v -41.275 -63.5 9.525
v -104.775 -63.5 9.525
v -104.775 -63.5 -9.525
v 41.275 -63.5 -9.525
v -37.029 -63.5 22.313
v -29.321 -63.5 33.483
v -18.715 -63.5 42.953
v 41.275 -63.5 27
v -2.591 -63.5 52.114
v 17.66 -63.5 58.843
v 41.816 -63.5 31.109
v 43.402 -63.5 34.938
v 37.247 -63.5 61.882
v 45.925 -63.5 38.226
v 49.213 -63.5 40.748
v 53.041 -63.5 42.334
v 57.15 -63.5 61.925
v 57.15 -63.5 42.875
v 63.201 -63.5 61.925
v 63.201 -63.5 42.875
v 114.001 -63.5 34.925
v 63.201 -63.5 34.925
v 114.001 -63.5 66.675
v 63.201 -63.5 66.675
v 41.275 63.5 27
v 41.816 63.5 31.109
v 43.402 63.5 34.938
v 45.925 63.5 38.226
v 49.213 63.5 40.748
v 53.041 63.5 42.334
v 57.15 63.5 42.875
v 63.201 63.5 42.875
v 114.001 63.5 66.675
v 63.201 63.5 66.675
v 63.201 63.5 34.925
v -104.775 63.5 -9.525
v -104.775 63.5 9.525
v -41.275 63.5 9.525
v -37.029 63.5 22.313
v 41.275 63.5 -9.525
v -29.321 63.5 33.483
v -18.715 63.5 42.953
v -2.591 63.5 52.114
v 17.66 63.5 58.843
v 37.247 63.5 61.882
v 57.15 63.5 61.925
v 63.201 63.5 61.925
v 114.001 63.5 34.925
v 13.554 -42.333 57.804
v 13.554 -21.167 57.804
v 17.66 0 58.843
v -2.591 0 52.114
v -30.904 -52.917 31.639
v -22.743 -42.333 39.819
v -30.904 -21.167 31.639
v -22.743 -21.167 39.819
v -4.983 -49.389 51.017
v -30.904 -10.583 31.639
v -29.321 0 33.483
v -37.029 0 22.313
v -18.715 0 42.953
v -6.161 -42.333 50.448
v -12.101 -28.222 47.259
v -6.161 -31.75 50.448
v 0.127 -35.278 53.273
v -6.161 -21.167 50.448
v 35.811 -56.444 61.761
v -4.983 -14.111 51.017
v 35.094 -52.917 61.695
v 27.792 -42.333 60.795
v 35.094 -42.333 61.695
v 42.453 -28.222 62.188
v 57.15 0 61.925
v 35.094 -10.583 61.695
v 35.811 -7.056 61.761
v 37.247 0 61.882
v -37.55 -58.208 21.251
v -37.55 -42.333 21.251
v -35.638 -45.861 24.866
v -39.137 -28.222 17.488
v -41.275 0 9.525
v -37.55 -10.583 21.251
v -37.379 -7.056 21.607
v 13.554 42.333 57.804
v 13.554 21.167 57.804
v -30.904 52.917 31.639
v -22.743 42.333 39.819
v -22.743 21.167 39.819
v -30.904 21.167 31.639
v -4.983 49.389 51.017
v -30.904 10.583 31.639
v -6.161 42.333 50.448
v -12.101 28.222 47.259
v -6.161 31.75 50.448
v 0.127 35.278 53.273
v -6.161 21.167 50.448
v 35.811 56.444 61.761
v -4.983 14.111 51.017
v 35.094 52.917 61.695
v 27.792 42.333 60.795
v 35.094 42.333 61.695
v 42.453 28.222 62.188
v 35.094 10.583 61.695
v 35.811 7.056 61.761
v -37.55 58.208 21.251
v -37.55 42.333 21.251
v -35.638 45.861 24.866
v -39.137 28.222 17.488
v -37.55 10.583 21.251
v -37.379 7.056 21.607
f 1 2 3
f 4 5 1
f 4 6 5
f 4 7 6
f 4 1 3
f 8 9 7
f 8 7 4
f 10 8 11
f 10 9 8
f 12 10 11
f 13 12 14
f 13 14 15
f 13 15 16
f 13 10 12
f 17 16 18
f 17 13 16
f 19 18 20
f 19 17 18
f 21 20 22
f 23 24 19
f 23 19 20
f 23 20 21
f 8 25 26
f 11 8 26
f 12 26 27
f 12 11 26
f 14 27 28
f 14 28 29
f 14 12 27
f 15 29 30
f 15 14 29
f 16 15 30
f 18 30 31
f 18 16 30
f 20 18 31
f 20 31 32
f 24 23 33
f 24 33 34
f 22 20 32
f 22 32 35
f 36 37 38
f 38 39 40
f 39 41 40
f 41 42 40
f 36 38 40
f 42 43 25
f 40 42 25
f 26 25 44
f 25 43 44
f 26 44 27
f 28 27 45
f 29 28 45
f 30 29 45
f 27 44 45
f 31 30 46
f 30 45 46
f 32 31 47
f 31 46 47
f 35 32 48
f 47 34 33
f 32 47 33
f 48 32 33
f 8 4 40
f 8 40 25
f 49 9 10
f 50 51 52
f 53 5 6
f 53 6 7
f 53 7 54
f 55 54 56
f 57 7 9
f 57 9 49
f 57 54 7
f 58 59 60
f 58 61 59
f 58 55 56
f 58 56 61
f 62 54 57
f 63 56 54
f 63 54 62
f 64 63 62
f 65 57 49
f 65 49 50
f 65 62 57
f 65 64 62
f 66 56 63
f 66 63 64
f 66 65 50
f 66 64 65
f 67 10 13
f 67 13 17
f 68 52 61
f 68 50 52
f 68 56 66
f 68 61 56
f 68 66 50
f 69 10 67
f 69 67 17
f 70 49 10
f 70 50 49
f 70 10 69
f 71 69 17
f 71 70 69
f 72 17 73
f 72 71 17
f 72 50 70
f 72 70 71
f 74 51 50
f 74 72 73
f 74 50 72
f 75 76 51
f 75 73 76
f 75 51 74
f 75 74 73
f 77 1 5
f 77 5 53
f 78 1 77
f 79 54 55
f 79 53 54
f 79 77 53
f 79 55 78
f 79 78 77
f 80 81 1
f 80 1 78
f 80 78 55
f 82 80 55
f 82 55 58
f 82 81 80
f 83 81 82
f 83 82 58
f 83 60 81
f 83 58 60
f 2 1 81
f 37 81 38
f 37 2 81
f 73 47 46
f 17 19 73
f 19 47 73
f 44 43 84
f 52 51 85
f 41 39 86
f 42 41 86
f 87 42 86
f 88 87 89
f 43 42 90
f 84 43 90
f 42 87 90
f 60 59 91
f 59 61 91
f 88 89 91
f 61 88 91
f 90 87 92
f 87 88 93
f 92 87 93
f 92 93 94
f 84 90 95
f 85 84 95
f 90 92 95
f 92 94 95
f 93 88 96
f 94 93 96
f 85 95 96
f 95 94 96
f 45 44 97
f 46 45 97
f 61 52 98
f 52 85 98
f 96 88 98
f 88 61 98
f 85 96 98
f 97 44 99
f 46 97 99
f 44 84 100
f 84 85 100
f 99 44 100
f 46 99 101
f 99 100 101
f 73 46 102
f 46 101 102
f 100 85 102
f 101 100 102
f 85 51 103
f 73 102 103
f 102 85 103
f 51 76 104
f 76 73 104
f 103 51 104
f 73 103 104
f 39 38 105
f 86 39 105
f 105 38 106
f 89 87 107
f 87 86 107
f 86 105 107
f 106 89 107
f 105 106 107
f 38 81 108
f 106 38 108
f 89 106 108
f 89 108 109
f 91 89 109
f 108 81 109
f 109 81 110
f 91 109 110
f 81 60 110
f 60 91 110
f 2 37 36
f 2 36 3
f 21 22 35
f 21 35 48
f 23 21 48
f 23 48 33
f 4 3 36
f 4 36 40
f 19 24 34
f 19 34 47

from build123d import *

# Parameters (mm, degrees)
F1_DEPTH = 63.5
F2_DEPTH = 63.5
F3_DEPTH = 63.5


with BuildPart() as f1:
    # F0 (on Front) → F1 (new body, symmetric)
    with BuildSketch(Plane.XZ):
        Polygon((-41.275, 9.525), (-41.275, -9.525), (41.275, -9.525), (41.275, 9.525), (22.225, 9.525), align=None)
    extrude(amount=F1_DEPTH, both=True)

    # F0 (on Front) → F2 (join, symmetric)
    with BuildSketch(Plane.XZ):
        Polygon((-41.275, 9.525), (-41.275, -9.525), (41.275, -9.525), (41.275, 9.525), (22.225, 9.525), align=None)
        with BuildLine():
            add(Edge.make_bspline(
                [(-41.275, 9.525), (-35.113391, 45.455925), (13.393071, 65.25448), (57.15, 61.9252)],
                knots=[0, 0, 0, 0, 111.504536, 111.504536, 111.504536, 111.504536], degree=3))
            Line((-41.275, 9.525), (22.225, 9.525))
            Line((22.225, 9.525), (22.225, 27.0002))
            ThreePointArc((22.225, 27.0002), (32.454296, 51.695904), (57.15, 61.9252))
        make_face()
        with BuildLine():
            Line((22.225, 9.525), (41.275, 9.525))
            Line((41.275, 9.525), (41.275, 27.0002))
            ThreePointArc((41.275, 27.0002), (45.92468, 38.22552), (57.15, 42.8752))
            Line((57.15, 42.8752), (63.200993, 42.8752))
            Line((63.200993, 42.8752), (63.200993, 61.9252))
            Line((63.200993, 61.9252), (57.15, 61.9252))
            ThreePointArc((57.15, 61.9252), (32.454296, 51.695904), (22.225, 27.0002))
            Line((22.225, 27.0002), (22.225, 9.525))
        make_face()
        Polygon((63.200993, 66.675), (63.200993, 61.9252), (63.200993, 42.8752), (87.960352, 42.8752), (88.600993, 66.675), align=None)
        Polygon((87.960352, 42.8752), (63.200993, 42.8752), (63.200993, 34.925), (114.000993, 34.925), (114.000993, 66.675), (88.600993, 66.675), align=None)
    extrude(amount=F2_DEPTH, both=True)

    # F1_face (on face) → F3 (join, symmetric)
    with BuildSketch(Plane(origin=(-41.275, 0, 0), x_dir=(0, -1, 0), z_dir=(-1, 0, 0))):
        Polygon((-63.5, 9.525), (-63.5, -9.525), (63.5, -9.525), (63.5, 9.525), (0, 9.525), align=None)
    extrude(amount=F3_DEPTH, both=True)


solid = f1.part
